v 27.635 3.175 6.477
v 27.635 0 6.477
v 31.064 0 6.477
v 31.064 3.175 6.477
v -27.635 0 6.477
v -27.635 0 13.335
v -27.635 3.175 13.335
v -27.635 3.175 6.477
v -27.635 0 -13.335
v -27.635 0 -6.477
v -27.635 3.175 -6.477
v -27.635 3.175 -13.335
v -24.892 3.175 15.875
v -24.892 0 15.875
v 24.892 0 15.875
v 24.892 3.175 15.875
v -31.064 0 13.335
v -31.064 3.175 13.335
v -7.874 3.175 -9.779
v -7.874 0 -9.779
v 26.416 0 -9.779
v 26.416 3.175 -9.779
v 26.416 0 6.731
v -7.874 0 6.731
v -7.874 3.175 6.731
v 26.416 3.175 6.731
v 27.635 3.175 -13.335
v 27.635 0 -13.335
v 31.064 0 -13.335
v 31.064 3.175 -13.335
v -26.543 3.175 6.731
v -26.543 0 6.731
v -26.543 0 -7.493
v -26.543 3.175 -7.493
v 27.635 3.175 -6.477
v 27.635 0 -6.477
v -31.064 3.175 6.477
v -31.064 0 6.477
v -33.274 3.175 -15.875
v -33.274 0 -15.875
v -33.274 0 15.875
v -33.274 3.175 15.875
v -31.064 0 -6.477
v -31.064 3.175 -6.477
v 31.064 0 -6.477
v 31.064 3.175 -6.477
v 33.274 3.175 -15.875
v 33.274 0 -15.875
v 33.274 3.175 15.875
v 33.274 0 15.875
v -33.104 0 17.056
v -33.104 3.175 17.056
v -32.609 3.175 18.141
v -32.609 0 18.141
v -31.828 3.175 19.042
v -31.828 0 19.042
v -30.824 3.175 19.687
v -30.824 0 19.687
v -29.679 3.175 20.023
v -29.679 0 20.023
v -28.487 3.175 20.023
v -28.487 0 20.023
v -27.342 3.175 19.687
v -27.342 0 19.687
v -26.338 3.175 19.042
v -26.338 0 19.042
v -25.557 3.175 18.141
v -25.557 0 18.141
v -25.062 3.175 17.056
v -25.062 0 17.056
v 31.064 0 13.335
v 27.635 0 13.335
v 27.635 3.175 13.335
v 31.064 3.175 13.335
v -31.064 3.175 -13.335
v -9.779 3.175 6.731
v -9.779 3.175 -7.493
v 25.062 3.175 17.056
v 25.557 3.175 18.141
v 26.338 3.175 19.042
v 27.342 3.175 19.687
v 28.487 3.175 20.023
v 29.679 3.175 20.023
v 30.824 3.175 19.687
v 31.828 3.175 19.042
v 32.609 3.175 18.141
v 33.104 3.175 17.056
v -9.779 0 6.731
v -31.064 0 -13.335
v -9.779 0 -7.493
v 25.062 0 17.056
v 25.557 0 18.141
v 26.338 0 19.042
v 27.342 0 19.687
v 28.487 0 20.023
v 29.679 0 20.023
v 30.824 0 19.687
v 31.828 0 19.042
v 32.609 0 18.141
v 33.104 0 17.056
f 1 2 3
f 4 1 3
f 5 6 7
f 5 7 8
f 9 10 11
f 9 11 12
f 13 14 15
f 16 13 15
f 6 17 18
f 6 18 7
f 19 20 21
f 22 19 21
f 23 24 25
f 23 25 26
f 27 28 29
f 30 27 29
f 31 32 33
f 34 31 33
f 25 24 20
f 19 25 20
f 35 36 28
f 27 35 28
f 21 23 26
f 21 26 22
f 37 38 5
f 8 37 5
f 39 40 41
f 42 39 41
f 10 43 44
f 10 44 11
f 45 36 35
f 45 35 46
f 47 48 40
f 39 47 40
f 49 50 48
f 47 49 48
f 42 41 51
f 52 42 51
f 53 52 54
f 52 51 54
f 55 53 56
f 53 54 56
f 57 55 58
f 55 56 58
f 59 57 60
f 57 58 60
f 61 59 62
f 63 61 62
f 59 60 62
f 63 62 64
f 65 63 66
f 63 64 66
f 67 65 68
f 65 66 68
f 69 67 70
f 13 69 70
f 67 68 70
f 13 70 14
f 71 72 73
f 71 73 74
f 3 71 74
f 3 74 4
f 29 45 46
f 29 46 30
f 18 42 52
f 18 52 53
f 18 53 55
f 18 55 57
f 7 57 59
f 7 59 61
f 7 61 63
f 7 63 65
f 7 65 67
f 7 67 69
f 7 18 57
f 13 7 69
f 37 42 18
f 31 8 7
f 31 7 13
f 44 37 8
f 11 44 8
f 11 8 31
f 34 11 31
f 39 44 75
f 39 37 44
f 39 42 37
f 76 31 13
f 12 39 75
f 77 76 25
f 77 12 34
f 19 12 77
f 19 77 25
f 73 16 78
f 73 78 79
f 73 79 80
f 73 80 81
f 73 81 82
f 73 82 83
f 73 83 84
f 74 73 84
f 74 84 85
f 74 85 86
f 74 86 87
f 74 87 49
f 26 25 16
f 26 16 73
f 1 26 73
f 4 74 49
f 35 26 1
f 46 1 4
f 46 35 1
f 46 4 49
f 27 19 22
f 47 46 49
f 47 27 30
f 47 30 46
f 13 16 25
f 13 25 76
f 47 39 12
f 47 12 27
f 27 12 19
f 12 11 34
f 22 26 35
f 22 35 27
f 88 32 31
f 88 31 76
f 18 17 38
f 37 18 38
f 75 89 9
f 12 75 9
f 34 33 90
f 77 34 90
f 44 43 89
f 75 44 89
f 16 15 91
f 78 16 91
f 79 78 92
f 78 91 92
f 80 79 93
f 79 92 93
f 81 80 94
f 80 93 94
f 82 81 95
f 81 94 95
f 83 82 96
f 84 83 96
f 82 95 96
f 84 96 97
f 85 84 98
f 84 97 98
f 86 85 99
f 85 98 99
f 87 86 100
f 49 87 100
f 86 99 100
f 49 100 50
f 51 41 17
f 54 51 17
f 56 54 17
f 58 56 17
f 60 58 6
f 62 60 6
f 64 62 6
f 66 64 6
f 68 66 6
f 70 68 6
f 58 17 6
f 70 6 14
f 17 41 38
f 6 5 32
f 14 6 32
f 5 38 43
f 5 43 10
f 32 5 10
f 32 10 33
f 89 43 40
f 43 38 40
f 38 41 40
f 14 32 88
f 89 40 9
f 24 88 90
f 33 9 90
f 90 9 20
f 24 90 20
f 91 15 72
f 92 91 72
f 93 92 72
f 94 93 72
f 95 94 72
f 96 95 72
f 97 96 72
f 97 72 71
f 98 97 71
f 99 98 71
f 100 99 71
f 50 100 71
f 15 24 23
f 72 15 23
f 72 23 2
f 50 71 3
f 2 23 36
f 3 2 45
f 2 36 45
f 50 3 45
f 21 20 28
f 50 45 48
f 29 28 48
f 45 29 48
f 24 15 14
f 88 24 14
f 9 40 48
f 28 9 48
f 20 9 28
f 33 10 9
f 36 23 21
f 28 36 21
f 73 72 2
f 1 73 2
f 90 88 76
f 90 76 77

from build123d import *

# Parameters (mm, degrees)
SKETCH1_W           = 3.429
SKETCH1_H           = 6.858
SKETCH1_W_2         = 34.29
SKETCH1_H_2         = 16.51
SKETCH1_W_3         = 16.764
SKETCH1_H_3         = 14.224
BOSS_EXTRUDE1_DEPTH = 3.175


with BuildPart() as part:
    # Sketch1 → Boss-Extrude1 (new body)
    with BuildSketch(Plane(origin=(0, 0, 0), x_dir=(1, 0, 0), z_dir=(0, 1, 0))):
        with BuildLine():
            Line((-24.892, -15.875), (24.892, -15.875))
            ThreePointArc((24.892, -15.875), (29.083, -20.066), (33.274, -15.875))
            Line((33.274, -15.875), (33.274, 15.875))
            Line((33.274, 15.875), (-33.274, 15.875))
            Line((-33.274, 15.875), (-33.274, -15.875))
            ThreePointArc((-33.274, -15.875), (-29.083, -20.066), (-24.892, -15.875))
        make_face()
        with Locations((29.3497, 9.906)):
            Rectangle(SKETCH1_W, SKETCH1_H, mode=Mode.SUBTRACT)
        with Locations((29.3497, -9.906)):
            Rectangle(SKETCH1_W, SKETCH1_H, mode=Mode.SUBTRACT)
        with Locations((-29.3497, -9.906)):
            Rectangle(SKETCH1_W, SKETCH1_H, mode=Mode.SUBTRACT)
        with Locations((-29.3497, 9.906)):
            Rectangle(SKETCH1_W, SKETCH1_H, mode=Mode.SUBTRACT)
        with Locations((9.271, 1.524)):
            Rectangle(SKETCH1_W_2, SKETCH1_H_2, mode=Mode.SUBTRACT)
        with Locations((-18.161, 0.381)):
            Rectangle(SKETCH1_W_3, SKETCH1_H_3, mode=Mode.SUBTRACT)
    extrude(amount=BOSS_EXTRUDE1_DEPTH)


solid = part.part
